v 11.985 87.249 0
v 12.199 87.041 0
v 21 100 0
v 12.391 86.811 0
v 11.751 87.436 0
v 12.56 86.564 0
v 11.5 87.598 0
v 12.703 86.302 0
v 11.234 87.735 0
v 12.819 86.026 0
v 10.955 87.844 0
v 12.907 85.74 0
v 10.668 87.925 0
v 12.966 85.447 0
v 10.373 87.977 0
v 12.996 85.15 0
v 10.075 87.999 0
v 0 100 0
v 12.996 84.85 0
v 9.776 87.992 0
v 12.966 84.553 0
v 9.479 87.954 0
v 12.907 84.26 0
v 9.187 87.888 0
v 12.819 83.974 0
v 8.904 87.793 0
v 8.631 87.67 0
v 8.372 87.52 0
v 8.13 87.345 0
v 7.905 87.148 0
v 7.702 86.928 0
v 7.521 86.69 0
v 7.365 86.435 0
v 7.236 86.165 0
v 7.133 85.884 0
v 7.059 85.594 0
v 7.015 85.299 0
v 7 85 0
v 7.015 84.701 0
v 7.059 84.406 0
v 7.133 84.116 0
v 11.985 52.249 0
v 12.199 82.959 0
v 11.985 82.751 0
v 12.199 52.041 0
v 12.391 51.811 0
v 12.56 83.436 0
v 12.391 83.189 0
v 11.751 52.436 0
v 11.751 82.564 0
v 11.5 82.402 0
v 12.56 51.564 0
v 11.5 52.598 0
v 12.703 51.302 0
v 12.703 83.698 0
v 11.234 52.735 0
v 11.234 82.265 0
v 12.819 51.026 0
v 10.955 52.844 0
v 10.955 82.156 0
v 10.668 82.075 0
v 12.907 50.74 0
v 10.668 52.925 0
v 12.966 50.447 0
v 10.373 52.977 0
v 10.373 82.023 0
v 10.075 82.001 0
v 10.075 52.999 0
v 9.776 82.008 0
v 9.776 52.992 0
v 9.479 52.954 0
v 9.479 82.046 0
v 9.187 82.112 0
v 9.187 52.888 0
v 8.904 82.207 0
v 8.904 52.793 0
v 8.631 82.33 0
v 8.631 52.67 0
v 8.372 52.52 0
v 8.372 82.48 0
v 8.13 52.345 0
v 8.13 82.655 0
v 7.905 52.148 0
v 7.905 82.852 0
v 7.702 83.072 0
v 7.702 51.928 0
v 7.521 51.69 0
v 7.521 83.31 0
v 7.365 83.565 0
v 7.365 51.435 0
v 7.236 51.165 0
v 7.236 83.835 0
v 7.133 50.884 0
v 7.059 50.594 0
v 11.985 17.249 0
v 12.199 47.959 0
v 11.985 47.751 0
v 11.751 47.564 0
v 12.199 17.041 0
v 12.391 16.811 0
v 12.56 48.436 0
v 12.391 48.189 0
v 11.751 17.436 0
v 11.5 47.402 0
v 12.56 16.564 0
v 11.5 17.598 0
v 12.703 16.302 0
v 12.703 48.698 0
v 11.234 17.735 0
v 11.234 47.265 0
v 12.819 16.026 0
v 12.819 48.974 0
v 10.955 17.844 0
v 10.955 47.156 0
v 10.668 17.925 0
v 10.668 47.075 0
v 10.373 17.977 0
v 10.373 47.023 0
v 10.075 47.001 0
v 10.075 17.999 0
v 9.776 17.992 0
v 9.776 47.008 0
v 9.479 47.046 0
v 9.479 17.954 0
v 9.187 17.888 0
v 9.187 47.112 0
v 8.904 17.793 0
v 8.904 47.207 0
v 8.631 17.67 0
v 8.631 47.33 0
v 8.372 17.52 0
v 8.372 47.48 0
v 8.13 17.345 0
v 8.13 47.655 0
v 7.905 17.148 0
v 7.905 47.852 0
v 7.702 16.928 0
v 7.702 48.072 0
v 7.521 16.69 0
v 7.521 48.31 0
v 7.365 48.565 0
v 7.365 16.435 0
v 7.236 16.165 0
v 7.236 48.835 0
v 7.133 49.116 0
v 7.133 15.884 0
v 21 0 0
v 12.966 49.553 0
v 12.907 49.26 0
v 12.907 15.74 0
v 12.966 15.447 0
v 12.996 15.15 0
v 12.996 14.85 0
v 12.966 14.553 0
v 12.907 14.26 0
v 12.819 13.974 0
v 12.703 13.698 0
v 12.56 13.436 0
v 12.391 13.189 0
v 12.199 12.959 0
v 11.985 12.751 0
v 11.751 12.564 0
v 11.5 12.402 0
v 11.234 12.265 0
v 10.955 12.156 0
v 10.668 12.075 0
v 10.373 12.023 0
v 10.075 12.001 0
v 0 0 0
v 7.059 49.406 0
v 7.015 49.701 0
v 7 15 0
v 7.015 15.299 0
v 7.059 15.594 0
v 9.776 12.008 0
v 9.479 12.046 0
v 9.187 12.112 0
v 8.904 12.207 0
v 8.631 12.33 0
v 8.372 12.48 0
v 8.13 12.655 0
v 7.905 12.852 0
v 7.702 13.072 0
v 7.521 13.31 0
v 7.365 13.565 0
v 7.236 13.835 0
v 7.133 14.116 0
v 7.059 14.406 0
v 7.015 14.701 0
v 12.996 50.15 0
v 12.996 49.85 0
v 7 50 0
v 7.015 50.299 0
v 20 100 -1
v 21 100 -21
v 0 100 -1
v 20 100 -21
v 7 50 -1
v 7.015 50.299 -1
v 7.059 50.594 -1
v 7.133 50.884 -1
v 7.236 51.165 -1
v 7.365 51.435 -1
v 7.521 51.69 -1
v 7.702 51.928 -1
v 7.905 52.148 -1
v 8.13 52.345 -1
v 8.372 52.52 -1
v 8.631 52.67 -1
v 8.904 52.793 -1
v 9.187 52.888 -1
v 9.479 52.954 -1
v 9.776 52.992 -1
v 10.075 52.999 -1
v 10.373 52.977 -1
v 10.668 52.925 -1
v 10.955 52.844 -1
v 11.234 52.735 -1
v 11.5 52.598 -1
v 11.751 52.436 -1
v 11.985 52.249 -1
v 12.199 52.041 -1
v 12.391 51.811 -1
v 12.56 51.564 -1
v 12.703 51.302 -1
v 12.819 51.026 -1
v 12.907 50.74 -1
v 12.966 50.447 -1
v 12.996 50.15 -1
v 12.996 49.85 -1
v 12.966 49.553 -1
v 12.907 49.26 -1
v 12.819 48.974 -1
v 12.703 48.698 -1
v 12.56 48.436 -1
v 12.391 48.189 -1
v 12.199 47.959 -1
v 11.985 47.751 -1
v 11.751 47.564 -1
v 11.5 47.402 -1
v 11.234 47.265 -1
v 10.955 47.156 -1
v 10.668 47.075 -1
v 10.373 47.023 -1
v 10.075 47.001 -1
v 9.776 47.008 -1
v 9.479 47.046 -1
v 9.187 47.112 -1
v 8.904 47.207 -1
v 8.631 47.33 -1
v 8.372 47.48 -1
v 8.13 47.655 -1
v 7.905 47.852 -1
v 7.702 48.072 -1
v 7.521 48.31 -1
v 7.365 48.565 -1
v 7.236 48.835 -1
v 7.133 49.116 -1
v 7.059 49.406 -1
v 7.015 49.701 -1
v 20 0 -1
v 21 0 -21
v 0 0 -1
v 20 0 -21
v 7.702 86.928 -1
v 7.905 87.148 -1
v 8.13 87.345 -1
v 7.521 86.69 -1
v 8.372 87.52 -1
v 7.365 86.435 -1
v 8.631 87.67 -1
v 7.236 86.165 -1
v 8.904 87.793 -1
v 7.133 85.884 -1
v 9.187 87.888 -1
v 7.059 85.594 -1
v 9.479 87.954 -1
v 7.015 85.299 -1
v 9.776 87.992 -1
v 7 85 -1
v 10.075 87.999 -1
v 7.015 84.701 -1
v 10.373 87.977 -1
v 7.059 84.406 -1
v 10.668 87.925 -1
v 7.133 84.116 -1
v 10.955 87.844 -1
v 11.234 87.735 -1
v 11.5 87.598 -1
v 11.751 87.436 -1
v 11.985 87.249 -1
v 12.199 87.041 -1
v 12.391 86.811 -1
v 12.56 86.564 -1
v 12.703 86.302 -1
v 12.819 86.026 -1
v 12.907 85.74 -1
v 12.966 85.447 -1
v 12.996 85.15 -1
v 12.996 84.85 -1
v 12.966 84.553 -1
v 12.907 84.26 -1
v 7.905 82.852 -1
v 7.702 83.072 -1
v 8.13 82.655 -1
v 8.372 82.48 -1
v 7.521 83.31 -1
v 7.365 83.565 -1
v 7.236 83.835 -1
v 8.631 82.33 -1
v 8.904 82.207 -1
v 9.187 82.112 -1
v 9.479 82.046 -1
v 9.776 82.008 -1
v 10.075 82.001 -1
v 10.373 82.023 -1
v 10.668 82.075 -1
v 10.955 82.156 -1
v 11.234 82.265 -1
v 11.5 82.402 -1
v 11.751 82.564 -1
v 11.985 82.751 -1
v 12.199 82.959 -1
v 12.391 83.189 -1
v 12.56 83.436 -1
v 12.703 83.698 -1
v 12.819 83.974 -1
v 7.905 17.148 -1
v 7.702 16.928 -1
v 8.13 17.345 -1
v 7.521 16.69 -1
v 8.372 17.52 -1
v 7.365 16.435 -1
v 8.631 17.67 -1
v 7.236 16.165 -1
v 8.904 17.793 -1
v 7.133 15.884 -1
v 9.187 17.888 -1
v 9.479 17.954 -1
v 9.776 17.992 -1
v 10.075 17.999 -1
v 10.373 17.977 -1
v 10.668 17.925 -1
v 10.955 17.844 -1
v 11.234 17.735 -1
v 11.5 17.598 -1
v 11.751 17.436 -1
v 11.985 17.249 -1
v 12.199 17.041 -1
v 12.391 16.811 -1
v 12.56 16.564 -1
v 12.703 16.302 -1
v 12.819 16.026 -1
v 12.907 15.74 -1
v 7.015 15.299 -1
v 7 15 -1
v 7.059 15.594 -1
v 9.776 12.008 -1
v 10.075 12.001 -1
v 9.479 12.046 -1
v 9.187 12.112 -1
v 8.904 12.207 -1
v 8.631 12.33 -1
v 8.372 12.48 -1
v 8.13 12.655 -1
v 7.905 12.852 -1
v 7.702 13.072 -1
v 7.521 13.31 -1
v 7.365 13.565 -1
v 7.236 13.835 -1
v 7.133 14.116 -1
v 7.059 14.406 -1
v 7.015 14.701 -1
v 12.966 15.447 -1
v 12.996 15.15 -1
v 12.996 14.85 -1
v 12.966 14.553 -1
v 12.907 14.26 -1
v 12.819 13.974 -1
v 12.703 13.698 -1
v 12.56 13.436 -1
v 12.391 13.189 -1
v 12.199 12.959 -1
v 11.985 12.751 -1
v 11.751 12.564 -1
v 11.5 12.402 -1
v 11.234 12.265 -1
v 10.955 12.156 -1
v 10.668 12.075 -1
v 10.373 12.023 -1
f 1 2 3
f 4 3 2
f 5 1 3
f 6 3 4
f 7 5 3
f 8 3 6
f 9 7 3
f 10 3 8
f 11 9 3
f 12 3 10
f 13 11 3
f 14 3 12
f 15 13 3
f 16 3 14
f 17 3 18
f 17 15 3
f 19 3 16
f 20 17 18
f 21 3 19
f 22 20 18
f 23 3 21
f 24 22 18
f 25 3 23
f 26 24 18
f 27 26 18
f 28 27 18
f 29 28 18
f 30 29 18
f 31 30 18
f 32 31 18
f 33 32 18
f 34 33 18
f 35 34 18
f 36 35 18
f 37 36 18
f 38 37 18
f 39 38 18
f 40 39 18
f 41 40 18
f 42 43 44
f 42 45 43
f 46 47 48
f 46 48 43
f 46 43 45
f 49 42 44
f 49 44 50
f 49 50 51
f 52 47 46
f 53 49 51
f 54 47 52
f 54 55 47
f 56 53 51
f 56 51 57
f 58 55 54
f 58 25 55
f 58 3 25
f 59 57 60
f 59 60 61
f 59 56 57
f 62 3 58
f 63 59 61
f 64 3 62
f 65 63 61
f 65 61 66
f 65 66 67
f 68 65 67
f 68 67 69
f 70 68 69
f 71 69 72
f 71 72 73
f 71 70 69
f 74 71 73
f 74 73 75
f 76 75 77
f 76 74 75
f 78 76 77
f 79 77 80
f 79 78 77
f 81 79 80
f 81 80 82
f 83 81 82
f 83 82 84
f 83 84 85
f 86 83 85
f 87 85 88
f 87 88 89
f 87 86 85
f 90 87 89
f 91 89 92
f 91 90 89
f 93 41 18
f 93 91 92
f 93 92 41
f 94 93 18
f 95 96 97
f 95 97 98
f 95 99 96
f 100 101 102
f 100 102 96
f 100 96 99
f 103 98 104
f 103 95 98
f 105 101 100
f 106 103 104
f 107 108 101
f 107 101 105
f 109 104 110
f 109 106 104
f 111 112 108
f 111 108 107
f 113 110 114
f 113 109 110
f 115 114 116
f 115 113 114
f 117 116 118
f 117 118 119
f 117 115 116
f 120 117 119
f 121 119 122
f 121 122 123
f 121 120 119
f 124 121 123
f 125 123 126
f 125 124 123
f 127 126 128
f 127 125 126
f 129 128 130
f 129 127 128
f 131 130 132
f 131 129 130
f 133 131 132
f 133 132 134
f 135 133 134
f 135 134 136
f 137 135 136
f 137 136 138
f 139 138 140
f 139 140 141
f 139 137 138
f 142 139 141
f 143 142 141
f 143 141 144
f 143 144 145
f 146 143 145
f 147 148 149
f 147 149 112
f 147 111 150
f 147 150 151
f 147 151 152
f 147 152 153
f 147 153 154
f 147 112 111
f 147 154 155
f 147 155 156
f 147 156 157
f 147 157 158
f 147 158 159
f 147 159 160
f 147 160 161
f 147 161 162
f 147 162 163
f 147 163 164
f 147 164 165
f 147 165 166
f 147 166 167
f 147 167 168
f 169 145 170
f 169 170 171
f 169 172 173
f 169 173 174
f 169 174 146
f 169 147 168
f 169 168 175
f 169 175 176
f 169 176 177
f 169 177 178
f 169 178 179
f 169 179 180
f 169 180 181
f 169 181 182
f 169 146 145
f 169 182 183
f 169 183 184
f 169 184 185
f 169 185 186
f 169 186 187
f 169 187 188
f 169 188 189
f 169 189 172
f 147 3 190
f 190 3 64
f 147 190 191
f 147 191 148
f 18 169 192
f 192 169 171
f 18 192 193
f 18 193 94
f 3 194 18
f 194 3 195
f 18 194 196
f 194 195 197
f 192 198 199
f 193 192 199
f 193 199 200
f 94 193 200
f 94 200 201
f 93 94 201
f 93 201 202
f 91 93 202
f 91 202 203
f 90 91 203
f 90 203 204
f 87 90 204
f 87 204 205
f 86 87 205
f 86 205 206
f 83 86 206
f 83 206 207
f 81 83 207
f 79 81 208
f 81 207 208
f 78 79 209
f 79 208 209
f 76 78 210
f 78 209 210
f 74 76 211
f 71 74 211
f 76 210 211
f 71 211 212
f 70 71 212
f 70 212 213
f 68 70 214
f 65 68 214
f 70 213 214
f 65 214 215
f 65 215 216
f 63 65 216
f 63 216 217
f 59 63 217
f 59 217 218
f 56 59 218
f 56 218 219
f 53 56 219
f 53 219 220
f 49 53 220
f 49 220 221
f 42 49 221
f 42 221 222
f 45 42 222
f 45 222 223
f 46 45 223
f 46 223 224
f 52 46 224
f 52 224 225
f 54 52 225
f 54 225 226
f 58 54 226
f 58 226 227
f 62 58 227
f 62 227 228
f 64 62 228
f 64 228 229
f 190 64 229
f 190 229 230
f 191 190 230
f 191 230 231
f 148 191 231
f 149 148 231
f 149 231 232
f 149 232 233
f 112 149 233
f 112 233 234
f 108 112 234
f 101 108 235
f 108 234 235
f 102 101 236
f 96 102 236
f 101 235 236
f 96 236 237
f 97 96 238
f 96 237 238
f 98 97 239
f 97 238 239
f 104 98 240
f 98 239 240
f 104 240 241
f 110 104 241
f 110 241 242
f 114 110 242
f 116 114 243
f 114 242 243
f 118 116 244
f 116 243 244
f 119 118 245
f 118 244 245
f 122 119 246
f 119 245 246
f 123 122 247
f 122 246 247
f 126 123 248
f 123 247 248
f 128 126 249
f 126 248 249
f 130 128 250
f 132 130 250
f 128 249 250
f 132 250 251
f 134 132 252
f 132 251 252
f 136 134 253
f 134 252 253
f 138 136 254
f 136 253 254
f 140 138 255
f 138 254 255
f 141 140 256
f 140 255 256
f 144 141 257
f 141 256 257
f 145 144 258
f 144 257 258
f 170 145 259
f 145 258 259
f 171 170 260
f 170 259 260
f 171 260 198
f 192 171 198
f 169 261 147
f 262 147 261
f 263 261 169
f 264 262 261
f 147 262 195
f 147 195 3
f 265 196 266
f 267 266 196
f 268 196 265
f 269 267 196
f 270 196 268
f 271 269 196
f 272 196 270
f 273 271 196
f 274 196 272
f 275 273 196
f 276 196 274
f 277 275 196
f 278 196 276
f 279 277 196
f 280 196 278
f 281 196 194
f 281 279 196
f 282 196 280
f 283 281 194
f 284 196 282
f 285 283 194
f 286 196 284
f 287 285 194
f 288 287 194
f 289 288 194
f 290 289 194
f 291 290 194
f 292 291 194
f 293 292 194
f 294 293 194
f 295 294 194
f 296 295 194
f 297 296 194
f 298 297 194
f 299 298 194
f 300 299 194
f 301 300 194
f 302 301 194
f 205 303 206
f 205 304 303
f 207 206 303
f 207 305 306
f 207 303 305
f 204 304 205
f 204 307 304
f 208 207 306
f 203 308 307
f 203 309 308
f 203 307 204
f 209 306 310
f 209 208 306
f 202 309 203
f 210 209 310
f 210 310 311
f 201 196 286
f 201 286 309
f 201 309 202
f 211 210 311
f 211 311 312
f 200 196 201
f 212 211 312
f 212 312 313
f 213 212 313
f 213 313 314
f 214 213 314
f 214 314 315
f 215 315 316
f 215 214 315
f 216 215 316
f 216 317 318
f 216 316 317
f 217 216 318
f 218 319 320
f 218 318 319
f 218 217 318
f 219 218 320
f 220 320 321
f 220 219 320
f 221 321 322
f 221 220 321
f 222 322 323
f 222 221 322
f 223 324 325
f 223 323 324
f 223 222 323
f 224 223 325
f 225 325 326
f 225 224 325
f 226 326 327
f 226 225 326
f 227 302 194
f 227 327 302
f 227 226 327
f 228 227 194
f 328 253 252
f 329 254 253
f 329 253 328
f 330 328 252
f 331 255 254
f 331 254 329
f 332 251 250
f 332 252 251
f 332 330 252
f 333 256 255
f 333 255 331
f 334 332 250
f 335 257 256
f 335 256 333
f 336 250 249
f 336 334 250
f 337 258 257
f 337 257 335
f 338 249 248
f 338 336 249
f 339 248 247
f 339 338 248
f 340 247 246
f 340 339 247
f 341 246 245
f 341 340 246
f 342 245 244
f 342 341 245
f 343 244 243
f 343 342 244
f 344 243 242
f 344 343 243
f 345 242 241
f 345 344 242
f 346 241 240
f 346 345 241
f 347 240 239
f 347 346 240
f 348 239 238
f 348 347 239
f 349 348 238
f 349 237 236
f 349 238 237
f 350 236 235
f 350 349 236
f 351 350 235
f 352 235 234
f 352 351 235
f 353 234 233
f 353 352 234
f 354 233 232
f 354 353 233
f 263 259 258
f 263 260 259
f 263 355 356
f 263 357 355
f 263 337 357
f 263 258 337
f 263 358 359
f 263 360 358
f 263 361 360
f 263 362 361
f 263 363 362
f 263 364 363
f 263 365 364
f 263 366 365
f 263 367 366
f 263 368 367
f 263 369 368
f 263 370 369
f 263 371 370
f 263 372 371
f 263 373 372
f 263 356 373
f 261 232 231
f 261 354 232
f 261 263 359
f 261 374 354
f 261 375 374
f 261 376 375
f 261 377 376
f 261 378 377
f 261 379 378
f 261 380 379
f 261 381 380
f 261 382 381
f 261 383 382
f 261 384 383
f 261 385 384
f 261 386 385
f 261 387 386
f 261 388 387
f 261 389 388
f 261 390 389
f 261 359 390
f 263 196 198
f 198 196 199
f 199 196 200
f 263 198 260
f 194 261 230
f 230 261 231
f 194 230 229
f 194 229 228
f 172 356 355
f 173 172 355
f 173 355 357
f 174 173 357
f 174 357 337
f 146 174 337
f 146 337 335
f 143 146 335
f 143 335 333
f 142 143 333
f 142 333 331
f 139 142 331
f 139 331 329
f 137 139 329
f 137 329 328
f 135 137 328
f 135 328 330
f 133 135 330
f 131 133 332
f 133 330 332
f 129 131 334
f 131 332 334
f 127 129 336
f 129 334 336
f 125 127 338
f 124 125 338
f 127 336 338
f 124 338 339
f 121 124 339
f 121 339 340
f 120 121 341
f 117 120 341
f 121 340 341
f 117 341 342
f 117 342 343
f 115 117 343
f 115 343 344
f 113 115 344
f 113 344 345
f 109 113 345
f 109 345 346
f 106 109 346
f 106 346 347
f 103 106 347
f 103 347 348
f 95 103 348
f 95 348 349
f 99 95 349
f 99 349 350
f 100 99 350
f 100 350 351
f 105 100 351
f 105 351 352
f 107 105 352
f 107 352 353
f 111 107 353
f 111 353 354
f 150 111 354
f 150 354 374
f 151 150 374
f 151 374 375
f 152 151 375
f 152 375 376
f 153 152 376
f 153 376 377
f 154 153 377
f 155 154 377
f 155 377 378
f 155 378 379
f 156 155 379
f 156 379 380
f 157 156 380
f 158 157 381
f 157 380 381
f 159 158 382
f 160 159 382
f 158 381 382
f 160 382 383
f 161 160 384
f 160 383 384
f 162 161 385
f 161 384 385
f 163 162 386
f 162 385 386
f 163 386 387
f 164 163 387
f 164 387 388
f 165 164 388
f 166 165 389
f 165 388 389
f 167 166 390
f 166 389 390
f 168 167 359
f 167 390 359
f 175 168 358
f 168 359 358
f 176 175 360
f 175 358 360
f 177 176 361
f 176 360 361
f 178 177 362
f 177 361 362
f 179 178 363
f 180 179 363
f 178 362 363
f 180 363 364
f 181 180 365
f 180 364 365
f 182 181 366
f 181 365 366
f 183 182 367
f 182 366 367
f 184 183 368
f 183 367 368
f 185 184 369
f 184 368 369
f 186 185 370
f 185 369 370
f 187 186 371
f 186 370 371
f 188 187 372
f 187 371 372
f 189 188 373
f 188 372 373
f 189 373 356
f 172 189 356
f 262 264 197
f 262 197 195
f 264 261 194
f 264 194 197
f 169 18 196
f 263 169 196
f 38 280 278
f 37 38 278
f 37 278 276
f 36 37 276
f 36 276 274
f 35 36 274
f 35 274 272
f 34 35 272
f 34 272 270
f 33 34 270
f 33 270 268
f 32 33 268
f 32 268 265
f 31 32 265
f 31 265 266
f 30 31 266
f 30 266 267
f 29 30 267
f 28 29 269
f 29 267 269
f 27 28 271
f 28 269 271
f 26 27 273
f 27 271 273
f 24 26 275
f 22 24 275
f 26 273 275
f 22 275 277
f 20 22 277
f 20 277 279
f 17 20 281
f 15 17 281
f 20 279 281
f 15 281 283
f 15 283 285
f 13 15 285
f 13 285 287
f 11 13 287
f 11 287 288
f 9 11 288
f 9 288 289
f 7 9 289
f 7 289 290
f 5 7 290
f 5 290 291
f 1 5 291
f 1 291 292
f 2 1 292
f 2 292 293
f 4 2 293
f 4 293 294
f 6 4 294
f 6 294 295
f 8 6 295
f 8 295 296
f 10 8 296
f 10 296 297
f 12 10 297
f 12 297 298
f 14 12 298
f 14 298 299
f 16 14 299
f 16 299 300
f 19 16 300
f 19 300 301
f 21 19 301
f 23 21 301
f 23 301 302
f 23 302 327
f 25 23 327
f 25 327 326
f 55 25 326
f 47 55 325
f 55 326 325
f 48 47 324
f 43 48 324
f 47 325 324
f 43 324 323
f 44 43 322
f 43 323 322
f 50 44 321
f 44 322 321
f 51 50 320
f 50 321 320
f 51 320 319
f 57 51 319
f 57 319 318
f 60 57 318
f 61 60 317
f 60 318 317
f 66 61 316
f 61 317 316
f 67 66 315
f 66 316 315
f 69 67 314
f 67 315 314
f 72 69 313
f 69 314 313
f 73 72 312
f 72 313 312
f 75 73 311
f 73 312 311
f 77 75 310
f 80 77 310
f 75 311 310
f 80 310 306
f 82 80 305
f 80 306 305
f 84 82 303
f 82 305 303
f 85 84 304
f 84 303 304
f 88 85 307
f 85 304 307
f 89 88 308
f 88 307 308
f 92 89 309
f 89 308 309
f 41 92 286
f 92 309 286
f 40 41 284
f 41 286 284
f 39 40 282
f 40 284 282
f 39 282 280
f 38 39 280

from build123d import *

# Parameters (mm, degrees)
BOSS_EXTRUDE1_DEPTH = 100
SKETCH2_R           = 3
CUT_EXTRUDE1_DEPTH  = 10


with BuildPart() as part:
    # Sketch1 → Boss-Extrude1 (new body)
    with BuildSketch(Plane(origin=(0, 0, 0), x_dir=(1, 0, 0), z_dir=(0, 1, 0))):
        Polygon((0, 0), (0, 1), (20, 1), (20, 21), (21, 21), (21, 0), align=None)
    extrude(amount=BOSS_EXTRUDE1_DEPTH)

    # Sketch2 → Cut-Extrude1 (cut)
    with BuildSketch(Plane(origin=(0, 0, -1), x_dir=(-1, 0, 0), z_dir=(0, 0, -1))):
        with Locations((-10, 15)):
            Circle(SKETCH2_R)
        with Locations((-10, 50)):
            Circle(SKETCH2_R)
        with Locations((-10, 85)):
            Circle(SKETCH2_R)
    extrude(amount=-CUT_EXTRUDE1_DEPTH, mode=Mode.SUBTRACT)


solid = part.part
